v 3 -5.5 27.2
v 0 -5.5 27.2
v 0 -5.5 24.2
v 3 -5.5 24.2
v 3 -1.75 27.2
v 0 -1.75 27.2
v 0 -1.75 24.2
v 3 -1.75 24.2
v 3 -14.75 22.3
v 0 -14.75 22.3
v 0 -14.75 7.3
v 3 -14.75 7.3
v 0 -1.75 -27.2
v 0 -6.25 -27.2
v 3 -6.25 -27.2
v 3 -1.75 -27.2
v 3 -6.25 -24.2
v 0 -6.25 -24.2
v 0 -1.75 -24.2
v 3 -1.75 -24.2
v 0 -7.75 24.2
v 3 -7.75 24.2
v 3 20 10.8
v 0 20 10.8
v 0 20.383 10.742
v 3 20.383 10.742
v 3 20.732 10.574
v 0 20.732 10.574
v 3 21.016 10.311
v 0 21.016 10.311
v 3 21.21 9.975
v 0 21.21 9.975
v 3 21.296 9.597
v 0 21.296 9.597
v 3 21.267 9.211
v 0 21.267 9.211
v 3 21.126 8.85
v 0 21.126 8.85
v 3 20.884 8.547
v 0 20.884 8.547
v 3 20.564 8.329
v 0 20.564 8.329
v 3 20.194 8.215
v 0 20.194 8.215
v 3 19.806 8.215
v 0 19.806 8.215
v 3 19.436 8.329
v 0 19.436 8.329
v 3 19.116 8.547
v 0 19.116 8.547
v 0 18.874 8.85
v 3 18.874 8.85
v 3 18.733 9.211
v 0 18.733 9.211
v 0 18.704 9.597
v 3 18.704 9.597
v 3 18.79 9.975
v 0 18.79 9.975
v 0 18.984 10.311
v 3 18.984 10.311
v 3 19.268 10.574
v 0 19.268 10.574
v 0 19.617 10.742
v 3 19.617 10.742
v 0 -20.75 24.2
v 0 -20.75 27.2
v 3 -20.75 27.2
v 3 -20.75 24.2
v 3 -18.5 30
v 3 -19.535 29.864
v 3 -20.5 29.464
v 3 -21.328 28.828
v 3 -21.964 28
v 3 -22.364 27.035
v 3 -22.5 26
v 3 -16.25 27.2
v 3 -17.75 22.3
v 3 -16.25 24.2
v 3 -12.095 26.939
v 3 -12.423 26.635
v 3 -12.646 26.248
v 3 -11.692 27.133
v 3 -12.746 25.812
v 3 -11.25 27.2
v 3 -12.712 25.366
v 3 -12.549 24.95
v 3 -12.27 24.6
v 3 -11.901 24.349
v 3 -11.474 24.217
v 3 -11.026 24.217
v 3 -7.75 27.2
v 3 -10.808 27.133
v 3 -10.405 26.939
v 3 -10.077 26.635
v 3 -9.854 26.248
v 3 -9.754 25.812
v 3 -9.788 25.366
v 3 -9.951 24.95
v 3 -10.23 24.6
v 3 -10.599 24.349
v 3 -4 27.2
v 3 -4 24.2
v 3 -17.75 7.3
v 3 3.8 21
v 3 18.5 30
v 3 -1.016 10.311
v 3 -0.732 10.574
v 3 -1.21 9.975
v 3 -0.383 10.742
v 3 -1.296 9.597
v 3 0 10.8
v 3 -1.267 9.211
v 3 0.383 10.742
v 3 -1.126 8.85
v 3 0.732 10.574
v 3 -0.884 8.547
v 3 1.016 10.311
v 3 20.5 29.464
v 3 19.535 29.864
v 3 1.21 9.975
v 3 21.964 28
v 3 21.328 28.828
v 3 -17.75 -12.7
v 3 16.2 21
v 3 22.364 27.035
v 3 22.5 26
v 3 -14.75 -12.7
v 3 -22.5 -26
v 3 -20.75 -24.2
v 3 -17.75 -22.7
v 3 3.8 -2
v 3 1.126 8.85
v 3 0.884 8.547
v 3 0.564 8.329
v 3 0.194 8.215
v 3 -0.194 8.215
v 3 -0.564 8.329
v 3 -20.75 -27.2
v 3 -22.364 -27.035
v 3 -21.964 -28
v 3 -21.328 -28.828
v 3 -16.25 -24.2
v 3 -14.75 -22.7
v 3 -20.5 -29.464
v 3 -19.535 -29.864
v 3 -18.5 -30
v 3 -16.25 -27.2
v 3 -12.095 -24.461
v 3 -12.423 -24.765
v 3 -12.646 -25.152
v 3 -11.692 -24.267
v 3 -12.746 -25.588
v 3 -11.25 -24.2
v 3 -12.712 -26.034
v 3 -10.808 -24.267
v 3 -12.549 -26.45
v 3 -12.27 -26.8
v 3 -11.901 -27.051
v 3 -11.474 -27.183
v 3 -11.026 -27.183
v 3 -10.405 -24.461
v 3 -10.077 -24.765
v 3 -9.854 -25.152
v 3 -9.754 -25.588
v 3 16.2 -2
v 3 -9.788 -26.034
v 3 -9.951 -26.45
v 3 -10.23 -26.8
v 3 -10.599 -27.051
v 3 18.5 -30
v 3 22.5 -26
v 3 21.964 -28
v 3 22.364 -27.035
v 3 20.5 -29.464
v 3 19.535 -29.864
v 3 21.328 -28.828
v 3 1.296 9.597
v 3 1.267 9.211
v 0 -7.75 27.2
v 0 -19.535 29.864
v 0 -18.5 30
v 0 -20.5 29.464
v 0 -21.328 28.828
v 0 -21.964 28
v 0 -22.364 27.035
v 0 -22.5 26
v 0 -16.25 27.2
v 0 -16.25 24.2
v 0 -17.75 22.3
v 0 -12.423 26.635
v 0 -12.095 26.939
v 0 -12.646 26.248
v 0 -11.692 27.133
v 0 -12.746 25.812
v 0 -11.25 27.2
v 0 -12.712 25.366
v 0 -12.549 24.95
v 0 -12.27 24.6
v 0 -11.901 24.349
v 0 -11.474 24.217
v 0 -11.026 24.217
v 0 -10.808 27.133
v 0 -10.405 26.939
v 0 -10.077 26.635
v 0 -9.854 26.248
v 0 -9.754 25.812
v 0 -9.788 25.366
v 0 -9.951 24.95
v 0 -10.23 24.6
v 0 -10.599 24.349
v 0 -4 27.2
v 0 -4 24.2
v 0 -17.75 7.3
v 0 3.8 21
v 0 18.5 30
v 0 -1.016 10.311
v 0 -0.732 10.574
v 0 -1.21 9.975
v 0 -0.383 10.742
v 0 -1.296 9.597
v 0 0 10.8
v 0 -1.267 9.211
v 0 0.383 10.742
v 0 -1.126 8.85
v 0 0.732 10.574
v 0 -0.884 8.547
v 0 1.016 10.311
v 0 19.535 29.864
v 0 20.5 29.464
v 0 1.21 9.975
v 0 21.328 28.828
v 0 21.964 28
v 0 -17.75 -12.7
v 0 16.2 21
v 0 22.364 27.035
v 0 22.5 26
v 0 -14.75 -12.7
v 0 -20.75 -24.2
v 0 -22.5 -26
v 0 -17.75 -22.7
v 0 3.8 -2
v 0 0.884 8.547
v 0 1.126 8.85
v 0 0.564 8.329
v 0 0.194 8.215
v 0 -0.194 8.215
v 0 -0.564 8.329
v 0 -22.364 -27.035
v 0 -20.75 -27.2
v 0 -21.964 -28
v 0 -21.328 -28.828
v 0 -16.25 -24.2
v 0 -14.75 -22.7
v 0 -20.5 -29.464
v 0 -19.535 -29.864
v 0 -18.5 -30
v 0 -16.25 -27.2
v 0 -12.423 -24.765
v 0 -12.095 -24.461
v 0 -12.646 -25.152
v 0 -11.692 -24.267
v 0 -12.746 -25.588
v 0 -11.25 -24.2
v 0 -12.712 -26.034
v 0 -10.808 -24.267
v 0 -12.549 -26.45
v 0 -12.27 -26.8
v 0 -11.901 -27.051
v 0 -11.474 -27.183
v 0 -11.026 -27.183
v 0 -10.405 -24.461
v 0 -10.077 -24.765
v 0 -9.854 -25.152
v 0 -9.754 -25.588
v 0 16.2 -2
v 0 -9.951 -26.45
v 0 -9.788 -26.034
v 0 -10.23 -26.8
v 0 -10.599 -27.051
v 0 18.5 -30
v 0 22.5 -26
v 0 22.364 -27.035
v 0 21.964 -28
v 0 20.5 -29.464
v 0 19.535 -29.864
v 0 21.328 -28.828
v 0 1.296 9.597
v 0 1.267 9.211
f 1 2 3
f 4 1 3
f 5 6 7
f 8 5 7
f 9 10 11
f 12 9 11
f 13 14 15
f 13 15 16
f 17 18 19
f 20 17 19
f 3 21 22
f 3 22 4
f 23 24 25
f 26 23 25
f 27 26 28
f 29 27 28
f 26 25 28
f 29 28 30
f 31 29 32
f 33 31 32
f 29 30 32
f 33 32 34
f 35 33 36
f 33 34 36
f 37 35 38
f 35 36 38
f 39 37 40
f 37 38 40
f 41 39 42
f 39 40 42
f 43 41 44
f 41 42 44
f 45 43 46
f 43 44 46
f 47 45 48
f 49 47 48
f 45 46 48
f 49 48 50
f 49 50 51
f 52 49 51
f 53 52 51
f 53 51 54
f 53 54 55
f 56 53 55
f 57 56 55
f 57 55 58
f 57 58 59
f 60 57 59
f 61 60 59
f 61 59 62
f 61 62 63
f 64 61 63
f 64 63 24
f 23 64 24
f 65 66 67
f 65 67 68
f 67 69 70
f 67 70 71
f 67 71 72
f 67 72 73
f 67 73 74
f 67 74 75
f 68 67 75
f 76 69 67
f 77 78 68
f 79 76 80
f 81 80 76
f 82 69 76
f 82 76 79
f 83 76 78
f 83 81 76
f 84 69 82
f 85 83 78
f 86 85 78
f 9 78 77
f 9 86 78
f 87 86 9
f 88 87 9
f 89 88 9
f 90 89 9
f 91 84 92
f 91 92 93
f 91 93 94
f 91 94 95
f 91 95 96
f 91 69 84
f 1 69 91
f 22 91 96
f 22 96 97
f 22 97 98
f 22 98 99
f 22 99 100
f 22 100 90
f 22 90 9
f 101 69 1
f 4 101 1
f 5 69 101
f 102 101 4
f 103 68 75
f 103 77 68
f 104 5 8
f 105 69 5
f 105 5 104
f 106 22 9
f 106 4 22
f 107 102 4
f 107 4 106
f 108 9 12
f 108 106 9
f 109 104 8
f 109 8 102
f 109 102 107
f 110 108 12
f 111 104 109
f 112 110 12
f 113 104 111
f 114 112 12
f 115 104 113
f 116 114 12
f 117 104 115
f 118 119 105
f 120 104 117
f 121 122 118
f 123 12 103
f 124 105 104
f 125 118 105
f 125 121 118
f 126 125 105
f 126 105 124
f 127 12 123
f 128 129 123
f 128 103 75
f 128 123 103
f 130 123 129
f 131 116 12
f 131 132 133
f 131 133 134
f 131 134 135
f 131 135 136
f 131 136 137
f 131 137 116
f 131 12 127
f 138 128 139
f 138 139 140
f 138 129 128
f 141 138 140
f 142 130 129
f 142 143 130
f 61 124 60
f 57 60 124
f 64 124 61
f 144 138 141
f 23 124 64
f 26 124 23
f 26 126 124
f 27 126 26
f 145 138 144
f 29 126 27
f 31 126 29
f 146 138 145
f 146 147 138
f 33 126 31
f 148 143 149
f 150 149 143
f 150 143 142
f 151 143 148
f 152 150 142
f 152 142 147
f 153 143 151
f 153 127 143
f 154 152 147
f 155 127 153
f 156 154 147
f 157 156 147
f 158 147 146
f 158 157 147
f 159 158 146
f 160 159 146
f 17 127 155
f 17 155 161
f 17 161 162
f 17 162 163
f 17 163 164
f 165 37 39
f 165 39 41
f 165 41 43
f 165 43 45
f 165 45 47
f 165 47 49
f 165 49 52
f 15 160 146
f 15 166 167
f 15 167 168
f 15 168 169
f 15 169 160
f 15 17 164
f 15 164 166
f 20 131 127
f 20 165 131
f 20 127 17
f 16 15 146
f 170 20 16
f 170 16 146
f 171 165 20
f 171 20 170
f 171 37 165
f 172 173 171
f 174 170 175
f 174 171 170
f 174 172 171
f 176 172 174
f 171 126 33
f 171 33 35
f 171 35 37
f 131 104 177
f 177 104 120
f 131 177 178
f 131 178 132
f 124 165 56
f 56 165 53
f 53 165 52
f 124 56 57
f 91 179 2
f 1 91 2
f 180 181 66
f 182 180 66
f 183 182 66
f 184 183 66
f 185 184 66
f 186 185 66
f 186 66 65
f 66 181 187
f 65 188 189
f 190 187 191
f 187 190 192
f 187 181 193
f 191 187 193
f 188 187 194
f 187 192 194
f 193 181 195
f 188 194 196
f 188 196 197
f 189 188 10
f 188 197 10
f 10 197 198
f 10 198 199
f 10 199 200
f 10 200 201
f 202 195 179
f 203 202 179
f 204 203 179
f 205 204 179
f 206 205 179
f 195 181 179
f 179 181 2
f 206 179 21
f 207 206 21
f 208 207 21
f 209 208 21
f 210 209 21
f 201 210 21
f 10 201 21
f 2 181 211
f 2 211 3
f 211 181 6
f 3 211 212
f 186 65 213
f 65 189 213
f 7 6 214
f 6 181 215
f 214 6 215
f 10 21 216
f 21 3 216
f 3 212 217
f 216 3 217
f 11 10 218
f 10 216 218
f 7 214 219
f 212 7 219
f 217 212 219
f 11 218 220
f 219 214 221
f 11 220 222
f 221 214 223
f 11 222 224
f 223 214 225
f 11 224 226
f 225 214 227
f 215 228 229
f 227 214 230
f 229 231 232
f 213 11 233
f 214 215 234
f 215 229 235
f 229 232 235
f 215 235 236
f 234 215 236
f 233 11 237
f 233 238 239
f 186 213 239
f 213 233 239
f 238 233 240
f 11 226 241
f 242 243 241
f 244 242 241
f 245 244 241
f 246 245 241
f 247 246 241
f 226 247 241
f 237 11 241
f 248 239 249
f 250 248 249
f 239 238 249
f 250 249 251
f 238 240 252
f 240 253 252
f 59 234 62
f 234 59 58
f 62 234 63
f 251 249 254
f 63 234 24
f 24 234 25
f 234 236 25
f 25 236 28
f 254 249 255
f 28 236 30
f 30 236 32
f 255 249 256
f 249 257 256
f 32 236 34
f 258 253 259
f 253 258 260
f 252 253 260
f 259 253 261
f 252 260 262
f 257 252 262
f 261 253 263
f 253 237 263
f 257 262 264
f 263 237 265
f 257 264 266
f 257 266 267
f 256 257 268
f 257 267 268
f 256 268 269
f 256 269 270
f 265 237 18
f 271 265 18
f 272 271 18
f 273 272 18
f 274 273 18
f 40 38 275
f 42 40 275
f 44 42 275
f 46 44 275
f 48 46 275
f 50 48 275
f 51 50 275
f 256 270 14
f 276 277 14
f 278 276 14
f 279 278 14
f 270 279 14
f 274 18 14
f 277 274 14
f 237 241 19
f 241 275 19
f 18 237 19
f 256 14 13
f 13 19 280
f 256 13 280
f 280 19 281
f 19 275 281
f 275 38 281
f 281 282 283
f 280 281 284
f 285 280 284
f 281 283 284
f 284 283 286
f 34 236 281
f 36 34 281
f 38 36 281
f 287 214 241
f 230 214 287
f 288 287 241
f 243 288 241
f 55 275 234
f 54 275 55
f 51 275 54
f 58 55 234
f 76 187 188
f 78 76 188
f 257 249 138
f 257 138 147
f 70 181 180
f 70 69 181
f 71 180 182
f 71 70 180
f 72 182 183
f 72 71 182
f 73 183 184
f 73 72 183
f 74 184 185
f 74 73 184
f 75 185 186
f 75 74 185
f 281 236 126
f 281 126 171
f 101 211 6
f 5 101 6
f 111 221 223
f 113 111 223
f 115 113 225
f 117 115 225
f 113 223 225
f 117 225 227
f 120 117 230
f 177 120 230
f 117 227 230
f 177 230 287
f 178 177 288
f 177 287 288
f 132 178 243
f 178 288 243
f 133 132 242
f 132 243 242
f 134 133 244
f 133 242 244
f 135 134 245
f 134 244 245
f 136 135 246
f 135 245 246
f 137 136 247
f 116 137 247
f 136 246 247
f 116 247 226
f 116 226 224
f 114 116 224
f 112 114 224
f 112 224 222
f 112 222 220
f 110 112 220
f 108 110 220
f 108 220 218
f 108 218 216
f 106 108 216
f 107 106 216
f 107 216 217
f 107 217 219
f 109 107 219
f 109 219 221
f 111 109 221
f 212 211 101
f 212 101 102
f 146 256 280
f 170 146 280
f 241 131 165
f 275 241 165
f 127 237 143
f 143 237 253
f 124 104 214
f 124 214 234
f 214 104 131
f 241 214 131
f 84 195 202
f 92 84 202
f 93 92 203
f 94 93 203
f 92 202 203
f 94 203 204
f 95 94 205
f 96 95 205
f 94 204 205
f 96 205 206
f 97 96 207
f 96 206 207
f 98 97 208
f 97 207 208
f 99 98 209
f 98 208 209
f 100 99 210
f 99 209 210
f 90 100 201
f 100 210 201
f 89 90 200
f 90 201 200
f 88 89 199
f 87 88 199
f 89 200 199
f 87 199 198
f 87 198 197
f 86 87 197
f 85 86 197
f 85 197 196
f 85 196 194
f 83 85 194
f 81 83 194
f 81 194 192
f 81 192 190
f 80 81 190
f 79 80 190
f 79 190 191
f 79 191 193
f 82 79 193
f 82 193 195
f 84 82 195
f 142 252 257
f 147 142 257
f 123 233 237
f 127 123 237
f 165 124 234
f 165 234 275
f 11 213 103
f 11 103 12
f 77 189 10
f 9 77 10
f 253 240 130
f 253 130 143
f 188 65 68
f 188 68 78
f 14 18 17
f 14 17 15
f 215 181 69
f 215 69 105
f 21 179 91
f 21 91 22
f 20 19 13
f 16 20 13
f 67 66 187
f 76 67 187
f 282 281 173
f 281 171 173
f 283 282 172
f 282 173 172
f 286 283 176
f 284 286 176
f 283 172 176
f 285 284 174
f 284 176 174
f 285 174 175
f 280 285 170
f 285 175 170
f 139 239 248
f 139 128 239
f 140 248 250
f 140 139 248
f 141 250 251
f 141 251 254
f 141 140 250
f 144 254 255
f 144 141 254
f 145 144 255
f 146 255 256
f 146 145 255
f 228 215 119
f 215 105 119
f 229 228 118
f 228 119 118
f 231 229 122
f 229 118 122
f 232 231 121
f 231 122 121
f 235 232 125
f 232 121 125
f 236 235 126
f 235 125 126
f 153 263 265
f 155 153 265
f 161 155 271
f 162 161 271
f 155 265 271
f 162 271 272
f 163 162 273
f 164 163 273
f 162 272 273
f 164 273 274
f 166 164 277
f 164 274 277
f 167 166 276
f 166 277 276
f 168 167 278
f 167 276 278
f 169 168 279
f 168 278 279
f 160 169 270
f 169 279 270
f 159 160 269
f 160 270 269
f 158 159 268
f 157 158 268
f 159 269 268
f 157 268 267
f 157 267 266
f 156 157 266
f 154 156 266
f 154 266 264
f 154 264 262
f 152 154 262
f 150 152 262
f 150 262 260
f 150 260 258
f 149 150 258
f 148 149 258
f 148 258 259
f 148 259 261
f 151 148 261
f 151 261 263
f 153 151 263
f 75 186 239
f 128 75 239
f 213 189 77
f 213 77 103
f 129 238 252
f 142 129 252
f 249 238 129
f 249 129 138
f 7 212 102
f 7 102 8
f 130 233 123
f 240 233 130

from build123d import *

# Parameters (mm, degrees)
ESBO_O1_W                    = 60
ESBO_O1_H                    = 45
RESSALTO_EXTRUS_O1_DEPTH     = 3
FURO_DE_DI_METRO_3_0_3_1_D   = 3
ESBO_O9_W                    = 3
ESBO_O9_H                    = 4.5
ESBO_O9_H_2                  = 2.25
CORTE_EXTRUS_O2_DEPTH        = 38.619808612
PERFIL_CORTE_W               = 23
PERFIL_CORTE_H               = 12.4
CORTE_PRINCIPAL_DEPTH        = 71.704257164
FURO_DE_DI_METRO_2_6_2_6_1_D = 2.6
FILETE1_R                    = 4
ESBO_O6_W                    = 15
ESBO_O6_H                    = 3
ESBO_O6_W_2                  = 10
CORTE_EXTRUS_O1_DEPTH        = 38.619808612


with BuildPart() as part:
    # Esboço1 → Ressalto-extrusão1 (new body)
    with BuildSketch(Plane(origin=(0, 0, 0), x_dir=(0, 0, -1), z_dir=(1, 0, 0))):
        Rectangle(ESBO_O1_W, ESBO_O1_H)
    extrude(amount=RESSALTO_EXTRUS_O1_DEPTH)

    # Furo de diâmetro Ø3.0 (3)1 (through all)
    with Locations(Plane(origin=(3, 0, 0), x_dir=(0, 0, -1), z_dir=(1, 0, 0))):
        with Locations((-25.7, -11.25), (25.7, -11.25)):
            Hole(FURO_DE_DI_METRO_3_0_3_1_D / 2)

    # Esboço9 → Corte-extrusão2 (cut, through all)
    with BuildSketch(Plane(origin=(0, 0, 0), x_dir=(0, 0, -1), z_dir=(1, 0, 0))):
        with Locations((-25.7, -18.5)):
            Rectangle(ESBO_O9_W, ESBO_O9_H)
        with Locations((-25.7, -2.875)):
            Rectangle(ESBO_O9_W, ESBO_O9_H_2)
        with Locations((-25.7, -6.625)):
            Rectangle(ESBO_O9_W, ESBO_O9_H_2)
        with Locations((25.7, -18.5)):
            Rectangle(ESBO_O9_W, ESBO_O9_H)
        with Locations((25.7, -4)):
            Rectangle(ESBO_O9_W, ESBO_O9_H)
    extrude(amount=CORTE_EXTRUS_O2_DEPTH, mode=Mode.SUBTRACT)

    # Perfil Corte → Corte Principal (cut, through all)
    with BuildSketch(Plane(origin=(3, -11.32307532, -32.016865102), x_dir=(0, 0, -1), z_dir=(1, 0, 0))):
        with Locations((-41.516865102, 21.32307532)):
            Rectangle(PERFIL_CORTE_W, PERFIL_CORTE_H)
    extrude(amount=-CORTE_PRINCIPAL_DEPTH, mode=Mode.SUBTRACT)

    # Furo de diâmetro Ø2.6 (2.6)1 (through all)
    with Locations(Plane(origin=(3, -5, 96.504216275), x_dir=(0, 0, -1), z_dir=(1, 0, 0))):
        with Locations((87.004216275, 25), (87.004216275, 5)):
            Hole(FURO_DE_DI_METRO_2_6_2_6_1_D / 2)

    # Filete1
    filete1_edges = [part.edges().sort_by_distance(p)[0] for p in [
        (1.5, 22.5, 30),
        (1.5, 22.5, -30),
        (1.5, -22.5, -30),
        (1.5, -22.5, 30),
    ]]
    fillet(filete1_edges, radius=FILETE1_R)

    # Esboço6 → Corte-extrusão1 (cut, through all)
    with BuildSketch(Plane(origin=(0, 0, 0), x_dir=(0, 0, -1), z_dir=(1, 0, 0))):
        with Locations((-14.8, -16.25)):
            Rectangle(ESBO_O6_W, ESBO_O6_H)
        with Locations((17.7, -16.25)):
            Rectangle(ESBO_O6_W_2, ESBO_O6_H)
    extrude(amount=CORTE_EXTRUS_O1_DEPTH, mode=Mode.SUBTRACT)


solid = part.part
